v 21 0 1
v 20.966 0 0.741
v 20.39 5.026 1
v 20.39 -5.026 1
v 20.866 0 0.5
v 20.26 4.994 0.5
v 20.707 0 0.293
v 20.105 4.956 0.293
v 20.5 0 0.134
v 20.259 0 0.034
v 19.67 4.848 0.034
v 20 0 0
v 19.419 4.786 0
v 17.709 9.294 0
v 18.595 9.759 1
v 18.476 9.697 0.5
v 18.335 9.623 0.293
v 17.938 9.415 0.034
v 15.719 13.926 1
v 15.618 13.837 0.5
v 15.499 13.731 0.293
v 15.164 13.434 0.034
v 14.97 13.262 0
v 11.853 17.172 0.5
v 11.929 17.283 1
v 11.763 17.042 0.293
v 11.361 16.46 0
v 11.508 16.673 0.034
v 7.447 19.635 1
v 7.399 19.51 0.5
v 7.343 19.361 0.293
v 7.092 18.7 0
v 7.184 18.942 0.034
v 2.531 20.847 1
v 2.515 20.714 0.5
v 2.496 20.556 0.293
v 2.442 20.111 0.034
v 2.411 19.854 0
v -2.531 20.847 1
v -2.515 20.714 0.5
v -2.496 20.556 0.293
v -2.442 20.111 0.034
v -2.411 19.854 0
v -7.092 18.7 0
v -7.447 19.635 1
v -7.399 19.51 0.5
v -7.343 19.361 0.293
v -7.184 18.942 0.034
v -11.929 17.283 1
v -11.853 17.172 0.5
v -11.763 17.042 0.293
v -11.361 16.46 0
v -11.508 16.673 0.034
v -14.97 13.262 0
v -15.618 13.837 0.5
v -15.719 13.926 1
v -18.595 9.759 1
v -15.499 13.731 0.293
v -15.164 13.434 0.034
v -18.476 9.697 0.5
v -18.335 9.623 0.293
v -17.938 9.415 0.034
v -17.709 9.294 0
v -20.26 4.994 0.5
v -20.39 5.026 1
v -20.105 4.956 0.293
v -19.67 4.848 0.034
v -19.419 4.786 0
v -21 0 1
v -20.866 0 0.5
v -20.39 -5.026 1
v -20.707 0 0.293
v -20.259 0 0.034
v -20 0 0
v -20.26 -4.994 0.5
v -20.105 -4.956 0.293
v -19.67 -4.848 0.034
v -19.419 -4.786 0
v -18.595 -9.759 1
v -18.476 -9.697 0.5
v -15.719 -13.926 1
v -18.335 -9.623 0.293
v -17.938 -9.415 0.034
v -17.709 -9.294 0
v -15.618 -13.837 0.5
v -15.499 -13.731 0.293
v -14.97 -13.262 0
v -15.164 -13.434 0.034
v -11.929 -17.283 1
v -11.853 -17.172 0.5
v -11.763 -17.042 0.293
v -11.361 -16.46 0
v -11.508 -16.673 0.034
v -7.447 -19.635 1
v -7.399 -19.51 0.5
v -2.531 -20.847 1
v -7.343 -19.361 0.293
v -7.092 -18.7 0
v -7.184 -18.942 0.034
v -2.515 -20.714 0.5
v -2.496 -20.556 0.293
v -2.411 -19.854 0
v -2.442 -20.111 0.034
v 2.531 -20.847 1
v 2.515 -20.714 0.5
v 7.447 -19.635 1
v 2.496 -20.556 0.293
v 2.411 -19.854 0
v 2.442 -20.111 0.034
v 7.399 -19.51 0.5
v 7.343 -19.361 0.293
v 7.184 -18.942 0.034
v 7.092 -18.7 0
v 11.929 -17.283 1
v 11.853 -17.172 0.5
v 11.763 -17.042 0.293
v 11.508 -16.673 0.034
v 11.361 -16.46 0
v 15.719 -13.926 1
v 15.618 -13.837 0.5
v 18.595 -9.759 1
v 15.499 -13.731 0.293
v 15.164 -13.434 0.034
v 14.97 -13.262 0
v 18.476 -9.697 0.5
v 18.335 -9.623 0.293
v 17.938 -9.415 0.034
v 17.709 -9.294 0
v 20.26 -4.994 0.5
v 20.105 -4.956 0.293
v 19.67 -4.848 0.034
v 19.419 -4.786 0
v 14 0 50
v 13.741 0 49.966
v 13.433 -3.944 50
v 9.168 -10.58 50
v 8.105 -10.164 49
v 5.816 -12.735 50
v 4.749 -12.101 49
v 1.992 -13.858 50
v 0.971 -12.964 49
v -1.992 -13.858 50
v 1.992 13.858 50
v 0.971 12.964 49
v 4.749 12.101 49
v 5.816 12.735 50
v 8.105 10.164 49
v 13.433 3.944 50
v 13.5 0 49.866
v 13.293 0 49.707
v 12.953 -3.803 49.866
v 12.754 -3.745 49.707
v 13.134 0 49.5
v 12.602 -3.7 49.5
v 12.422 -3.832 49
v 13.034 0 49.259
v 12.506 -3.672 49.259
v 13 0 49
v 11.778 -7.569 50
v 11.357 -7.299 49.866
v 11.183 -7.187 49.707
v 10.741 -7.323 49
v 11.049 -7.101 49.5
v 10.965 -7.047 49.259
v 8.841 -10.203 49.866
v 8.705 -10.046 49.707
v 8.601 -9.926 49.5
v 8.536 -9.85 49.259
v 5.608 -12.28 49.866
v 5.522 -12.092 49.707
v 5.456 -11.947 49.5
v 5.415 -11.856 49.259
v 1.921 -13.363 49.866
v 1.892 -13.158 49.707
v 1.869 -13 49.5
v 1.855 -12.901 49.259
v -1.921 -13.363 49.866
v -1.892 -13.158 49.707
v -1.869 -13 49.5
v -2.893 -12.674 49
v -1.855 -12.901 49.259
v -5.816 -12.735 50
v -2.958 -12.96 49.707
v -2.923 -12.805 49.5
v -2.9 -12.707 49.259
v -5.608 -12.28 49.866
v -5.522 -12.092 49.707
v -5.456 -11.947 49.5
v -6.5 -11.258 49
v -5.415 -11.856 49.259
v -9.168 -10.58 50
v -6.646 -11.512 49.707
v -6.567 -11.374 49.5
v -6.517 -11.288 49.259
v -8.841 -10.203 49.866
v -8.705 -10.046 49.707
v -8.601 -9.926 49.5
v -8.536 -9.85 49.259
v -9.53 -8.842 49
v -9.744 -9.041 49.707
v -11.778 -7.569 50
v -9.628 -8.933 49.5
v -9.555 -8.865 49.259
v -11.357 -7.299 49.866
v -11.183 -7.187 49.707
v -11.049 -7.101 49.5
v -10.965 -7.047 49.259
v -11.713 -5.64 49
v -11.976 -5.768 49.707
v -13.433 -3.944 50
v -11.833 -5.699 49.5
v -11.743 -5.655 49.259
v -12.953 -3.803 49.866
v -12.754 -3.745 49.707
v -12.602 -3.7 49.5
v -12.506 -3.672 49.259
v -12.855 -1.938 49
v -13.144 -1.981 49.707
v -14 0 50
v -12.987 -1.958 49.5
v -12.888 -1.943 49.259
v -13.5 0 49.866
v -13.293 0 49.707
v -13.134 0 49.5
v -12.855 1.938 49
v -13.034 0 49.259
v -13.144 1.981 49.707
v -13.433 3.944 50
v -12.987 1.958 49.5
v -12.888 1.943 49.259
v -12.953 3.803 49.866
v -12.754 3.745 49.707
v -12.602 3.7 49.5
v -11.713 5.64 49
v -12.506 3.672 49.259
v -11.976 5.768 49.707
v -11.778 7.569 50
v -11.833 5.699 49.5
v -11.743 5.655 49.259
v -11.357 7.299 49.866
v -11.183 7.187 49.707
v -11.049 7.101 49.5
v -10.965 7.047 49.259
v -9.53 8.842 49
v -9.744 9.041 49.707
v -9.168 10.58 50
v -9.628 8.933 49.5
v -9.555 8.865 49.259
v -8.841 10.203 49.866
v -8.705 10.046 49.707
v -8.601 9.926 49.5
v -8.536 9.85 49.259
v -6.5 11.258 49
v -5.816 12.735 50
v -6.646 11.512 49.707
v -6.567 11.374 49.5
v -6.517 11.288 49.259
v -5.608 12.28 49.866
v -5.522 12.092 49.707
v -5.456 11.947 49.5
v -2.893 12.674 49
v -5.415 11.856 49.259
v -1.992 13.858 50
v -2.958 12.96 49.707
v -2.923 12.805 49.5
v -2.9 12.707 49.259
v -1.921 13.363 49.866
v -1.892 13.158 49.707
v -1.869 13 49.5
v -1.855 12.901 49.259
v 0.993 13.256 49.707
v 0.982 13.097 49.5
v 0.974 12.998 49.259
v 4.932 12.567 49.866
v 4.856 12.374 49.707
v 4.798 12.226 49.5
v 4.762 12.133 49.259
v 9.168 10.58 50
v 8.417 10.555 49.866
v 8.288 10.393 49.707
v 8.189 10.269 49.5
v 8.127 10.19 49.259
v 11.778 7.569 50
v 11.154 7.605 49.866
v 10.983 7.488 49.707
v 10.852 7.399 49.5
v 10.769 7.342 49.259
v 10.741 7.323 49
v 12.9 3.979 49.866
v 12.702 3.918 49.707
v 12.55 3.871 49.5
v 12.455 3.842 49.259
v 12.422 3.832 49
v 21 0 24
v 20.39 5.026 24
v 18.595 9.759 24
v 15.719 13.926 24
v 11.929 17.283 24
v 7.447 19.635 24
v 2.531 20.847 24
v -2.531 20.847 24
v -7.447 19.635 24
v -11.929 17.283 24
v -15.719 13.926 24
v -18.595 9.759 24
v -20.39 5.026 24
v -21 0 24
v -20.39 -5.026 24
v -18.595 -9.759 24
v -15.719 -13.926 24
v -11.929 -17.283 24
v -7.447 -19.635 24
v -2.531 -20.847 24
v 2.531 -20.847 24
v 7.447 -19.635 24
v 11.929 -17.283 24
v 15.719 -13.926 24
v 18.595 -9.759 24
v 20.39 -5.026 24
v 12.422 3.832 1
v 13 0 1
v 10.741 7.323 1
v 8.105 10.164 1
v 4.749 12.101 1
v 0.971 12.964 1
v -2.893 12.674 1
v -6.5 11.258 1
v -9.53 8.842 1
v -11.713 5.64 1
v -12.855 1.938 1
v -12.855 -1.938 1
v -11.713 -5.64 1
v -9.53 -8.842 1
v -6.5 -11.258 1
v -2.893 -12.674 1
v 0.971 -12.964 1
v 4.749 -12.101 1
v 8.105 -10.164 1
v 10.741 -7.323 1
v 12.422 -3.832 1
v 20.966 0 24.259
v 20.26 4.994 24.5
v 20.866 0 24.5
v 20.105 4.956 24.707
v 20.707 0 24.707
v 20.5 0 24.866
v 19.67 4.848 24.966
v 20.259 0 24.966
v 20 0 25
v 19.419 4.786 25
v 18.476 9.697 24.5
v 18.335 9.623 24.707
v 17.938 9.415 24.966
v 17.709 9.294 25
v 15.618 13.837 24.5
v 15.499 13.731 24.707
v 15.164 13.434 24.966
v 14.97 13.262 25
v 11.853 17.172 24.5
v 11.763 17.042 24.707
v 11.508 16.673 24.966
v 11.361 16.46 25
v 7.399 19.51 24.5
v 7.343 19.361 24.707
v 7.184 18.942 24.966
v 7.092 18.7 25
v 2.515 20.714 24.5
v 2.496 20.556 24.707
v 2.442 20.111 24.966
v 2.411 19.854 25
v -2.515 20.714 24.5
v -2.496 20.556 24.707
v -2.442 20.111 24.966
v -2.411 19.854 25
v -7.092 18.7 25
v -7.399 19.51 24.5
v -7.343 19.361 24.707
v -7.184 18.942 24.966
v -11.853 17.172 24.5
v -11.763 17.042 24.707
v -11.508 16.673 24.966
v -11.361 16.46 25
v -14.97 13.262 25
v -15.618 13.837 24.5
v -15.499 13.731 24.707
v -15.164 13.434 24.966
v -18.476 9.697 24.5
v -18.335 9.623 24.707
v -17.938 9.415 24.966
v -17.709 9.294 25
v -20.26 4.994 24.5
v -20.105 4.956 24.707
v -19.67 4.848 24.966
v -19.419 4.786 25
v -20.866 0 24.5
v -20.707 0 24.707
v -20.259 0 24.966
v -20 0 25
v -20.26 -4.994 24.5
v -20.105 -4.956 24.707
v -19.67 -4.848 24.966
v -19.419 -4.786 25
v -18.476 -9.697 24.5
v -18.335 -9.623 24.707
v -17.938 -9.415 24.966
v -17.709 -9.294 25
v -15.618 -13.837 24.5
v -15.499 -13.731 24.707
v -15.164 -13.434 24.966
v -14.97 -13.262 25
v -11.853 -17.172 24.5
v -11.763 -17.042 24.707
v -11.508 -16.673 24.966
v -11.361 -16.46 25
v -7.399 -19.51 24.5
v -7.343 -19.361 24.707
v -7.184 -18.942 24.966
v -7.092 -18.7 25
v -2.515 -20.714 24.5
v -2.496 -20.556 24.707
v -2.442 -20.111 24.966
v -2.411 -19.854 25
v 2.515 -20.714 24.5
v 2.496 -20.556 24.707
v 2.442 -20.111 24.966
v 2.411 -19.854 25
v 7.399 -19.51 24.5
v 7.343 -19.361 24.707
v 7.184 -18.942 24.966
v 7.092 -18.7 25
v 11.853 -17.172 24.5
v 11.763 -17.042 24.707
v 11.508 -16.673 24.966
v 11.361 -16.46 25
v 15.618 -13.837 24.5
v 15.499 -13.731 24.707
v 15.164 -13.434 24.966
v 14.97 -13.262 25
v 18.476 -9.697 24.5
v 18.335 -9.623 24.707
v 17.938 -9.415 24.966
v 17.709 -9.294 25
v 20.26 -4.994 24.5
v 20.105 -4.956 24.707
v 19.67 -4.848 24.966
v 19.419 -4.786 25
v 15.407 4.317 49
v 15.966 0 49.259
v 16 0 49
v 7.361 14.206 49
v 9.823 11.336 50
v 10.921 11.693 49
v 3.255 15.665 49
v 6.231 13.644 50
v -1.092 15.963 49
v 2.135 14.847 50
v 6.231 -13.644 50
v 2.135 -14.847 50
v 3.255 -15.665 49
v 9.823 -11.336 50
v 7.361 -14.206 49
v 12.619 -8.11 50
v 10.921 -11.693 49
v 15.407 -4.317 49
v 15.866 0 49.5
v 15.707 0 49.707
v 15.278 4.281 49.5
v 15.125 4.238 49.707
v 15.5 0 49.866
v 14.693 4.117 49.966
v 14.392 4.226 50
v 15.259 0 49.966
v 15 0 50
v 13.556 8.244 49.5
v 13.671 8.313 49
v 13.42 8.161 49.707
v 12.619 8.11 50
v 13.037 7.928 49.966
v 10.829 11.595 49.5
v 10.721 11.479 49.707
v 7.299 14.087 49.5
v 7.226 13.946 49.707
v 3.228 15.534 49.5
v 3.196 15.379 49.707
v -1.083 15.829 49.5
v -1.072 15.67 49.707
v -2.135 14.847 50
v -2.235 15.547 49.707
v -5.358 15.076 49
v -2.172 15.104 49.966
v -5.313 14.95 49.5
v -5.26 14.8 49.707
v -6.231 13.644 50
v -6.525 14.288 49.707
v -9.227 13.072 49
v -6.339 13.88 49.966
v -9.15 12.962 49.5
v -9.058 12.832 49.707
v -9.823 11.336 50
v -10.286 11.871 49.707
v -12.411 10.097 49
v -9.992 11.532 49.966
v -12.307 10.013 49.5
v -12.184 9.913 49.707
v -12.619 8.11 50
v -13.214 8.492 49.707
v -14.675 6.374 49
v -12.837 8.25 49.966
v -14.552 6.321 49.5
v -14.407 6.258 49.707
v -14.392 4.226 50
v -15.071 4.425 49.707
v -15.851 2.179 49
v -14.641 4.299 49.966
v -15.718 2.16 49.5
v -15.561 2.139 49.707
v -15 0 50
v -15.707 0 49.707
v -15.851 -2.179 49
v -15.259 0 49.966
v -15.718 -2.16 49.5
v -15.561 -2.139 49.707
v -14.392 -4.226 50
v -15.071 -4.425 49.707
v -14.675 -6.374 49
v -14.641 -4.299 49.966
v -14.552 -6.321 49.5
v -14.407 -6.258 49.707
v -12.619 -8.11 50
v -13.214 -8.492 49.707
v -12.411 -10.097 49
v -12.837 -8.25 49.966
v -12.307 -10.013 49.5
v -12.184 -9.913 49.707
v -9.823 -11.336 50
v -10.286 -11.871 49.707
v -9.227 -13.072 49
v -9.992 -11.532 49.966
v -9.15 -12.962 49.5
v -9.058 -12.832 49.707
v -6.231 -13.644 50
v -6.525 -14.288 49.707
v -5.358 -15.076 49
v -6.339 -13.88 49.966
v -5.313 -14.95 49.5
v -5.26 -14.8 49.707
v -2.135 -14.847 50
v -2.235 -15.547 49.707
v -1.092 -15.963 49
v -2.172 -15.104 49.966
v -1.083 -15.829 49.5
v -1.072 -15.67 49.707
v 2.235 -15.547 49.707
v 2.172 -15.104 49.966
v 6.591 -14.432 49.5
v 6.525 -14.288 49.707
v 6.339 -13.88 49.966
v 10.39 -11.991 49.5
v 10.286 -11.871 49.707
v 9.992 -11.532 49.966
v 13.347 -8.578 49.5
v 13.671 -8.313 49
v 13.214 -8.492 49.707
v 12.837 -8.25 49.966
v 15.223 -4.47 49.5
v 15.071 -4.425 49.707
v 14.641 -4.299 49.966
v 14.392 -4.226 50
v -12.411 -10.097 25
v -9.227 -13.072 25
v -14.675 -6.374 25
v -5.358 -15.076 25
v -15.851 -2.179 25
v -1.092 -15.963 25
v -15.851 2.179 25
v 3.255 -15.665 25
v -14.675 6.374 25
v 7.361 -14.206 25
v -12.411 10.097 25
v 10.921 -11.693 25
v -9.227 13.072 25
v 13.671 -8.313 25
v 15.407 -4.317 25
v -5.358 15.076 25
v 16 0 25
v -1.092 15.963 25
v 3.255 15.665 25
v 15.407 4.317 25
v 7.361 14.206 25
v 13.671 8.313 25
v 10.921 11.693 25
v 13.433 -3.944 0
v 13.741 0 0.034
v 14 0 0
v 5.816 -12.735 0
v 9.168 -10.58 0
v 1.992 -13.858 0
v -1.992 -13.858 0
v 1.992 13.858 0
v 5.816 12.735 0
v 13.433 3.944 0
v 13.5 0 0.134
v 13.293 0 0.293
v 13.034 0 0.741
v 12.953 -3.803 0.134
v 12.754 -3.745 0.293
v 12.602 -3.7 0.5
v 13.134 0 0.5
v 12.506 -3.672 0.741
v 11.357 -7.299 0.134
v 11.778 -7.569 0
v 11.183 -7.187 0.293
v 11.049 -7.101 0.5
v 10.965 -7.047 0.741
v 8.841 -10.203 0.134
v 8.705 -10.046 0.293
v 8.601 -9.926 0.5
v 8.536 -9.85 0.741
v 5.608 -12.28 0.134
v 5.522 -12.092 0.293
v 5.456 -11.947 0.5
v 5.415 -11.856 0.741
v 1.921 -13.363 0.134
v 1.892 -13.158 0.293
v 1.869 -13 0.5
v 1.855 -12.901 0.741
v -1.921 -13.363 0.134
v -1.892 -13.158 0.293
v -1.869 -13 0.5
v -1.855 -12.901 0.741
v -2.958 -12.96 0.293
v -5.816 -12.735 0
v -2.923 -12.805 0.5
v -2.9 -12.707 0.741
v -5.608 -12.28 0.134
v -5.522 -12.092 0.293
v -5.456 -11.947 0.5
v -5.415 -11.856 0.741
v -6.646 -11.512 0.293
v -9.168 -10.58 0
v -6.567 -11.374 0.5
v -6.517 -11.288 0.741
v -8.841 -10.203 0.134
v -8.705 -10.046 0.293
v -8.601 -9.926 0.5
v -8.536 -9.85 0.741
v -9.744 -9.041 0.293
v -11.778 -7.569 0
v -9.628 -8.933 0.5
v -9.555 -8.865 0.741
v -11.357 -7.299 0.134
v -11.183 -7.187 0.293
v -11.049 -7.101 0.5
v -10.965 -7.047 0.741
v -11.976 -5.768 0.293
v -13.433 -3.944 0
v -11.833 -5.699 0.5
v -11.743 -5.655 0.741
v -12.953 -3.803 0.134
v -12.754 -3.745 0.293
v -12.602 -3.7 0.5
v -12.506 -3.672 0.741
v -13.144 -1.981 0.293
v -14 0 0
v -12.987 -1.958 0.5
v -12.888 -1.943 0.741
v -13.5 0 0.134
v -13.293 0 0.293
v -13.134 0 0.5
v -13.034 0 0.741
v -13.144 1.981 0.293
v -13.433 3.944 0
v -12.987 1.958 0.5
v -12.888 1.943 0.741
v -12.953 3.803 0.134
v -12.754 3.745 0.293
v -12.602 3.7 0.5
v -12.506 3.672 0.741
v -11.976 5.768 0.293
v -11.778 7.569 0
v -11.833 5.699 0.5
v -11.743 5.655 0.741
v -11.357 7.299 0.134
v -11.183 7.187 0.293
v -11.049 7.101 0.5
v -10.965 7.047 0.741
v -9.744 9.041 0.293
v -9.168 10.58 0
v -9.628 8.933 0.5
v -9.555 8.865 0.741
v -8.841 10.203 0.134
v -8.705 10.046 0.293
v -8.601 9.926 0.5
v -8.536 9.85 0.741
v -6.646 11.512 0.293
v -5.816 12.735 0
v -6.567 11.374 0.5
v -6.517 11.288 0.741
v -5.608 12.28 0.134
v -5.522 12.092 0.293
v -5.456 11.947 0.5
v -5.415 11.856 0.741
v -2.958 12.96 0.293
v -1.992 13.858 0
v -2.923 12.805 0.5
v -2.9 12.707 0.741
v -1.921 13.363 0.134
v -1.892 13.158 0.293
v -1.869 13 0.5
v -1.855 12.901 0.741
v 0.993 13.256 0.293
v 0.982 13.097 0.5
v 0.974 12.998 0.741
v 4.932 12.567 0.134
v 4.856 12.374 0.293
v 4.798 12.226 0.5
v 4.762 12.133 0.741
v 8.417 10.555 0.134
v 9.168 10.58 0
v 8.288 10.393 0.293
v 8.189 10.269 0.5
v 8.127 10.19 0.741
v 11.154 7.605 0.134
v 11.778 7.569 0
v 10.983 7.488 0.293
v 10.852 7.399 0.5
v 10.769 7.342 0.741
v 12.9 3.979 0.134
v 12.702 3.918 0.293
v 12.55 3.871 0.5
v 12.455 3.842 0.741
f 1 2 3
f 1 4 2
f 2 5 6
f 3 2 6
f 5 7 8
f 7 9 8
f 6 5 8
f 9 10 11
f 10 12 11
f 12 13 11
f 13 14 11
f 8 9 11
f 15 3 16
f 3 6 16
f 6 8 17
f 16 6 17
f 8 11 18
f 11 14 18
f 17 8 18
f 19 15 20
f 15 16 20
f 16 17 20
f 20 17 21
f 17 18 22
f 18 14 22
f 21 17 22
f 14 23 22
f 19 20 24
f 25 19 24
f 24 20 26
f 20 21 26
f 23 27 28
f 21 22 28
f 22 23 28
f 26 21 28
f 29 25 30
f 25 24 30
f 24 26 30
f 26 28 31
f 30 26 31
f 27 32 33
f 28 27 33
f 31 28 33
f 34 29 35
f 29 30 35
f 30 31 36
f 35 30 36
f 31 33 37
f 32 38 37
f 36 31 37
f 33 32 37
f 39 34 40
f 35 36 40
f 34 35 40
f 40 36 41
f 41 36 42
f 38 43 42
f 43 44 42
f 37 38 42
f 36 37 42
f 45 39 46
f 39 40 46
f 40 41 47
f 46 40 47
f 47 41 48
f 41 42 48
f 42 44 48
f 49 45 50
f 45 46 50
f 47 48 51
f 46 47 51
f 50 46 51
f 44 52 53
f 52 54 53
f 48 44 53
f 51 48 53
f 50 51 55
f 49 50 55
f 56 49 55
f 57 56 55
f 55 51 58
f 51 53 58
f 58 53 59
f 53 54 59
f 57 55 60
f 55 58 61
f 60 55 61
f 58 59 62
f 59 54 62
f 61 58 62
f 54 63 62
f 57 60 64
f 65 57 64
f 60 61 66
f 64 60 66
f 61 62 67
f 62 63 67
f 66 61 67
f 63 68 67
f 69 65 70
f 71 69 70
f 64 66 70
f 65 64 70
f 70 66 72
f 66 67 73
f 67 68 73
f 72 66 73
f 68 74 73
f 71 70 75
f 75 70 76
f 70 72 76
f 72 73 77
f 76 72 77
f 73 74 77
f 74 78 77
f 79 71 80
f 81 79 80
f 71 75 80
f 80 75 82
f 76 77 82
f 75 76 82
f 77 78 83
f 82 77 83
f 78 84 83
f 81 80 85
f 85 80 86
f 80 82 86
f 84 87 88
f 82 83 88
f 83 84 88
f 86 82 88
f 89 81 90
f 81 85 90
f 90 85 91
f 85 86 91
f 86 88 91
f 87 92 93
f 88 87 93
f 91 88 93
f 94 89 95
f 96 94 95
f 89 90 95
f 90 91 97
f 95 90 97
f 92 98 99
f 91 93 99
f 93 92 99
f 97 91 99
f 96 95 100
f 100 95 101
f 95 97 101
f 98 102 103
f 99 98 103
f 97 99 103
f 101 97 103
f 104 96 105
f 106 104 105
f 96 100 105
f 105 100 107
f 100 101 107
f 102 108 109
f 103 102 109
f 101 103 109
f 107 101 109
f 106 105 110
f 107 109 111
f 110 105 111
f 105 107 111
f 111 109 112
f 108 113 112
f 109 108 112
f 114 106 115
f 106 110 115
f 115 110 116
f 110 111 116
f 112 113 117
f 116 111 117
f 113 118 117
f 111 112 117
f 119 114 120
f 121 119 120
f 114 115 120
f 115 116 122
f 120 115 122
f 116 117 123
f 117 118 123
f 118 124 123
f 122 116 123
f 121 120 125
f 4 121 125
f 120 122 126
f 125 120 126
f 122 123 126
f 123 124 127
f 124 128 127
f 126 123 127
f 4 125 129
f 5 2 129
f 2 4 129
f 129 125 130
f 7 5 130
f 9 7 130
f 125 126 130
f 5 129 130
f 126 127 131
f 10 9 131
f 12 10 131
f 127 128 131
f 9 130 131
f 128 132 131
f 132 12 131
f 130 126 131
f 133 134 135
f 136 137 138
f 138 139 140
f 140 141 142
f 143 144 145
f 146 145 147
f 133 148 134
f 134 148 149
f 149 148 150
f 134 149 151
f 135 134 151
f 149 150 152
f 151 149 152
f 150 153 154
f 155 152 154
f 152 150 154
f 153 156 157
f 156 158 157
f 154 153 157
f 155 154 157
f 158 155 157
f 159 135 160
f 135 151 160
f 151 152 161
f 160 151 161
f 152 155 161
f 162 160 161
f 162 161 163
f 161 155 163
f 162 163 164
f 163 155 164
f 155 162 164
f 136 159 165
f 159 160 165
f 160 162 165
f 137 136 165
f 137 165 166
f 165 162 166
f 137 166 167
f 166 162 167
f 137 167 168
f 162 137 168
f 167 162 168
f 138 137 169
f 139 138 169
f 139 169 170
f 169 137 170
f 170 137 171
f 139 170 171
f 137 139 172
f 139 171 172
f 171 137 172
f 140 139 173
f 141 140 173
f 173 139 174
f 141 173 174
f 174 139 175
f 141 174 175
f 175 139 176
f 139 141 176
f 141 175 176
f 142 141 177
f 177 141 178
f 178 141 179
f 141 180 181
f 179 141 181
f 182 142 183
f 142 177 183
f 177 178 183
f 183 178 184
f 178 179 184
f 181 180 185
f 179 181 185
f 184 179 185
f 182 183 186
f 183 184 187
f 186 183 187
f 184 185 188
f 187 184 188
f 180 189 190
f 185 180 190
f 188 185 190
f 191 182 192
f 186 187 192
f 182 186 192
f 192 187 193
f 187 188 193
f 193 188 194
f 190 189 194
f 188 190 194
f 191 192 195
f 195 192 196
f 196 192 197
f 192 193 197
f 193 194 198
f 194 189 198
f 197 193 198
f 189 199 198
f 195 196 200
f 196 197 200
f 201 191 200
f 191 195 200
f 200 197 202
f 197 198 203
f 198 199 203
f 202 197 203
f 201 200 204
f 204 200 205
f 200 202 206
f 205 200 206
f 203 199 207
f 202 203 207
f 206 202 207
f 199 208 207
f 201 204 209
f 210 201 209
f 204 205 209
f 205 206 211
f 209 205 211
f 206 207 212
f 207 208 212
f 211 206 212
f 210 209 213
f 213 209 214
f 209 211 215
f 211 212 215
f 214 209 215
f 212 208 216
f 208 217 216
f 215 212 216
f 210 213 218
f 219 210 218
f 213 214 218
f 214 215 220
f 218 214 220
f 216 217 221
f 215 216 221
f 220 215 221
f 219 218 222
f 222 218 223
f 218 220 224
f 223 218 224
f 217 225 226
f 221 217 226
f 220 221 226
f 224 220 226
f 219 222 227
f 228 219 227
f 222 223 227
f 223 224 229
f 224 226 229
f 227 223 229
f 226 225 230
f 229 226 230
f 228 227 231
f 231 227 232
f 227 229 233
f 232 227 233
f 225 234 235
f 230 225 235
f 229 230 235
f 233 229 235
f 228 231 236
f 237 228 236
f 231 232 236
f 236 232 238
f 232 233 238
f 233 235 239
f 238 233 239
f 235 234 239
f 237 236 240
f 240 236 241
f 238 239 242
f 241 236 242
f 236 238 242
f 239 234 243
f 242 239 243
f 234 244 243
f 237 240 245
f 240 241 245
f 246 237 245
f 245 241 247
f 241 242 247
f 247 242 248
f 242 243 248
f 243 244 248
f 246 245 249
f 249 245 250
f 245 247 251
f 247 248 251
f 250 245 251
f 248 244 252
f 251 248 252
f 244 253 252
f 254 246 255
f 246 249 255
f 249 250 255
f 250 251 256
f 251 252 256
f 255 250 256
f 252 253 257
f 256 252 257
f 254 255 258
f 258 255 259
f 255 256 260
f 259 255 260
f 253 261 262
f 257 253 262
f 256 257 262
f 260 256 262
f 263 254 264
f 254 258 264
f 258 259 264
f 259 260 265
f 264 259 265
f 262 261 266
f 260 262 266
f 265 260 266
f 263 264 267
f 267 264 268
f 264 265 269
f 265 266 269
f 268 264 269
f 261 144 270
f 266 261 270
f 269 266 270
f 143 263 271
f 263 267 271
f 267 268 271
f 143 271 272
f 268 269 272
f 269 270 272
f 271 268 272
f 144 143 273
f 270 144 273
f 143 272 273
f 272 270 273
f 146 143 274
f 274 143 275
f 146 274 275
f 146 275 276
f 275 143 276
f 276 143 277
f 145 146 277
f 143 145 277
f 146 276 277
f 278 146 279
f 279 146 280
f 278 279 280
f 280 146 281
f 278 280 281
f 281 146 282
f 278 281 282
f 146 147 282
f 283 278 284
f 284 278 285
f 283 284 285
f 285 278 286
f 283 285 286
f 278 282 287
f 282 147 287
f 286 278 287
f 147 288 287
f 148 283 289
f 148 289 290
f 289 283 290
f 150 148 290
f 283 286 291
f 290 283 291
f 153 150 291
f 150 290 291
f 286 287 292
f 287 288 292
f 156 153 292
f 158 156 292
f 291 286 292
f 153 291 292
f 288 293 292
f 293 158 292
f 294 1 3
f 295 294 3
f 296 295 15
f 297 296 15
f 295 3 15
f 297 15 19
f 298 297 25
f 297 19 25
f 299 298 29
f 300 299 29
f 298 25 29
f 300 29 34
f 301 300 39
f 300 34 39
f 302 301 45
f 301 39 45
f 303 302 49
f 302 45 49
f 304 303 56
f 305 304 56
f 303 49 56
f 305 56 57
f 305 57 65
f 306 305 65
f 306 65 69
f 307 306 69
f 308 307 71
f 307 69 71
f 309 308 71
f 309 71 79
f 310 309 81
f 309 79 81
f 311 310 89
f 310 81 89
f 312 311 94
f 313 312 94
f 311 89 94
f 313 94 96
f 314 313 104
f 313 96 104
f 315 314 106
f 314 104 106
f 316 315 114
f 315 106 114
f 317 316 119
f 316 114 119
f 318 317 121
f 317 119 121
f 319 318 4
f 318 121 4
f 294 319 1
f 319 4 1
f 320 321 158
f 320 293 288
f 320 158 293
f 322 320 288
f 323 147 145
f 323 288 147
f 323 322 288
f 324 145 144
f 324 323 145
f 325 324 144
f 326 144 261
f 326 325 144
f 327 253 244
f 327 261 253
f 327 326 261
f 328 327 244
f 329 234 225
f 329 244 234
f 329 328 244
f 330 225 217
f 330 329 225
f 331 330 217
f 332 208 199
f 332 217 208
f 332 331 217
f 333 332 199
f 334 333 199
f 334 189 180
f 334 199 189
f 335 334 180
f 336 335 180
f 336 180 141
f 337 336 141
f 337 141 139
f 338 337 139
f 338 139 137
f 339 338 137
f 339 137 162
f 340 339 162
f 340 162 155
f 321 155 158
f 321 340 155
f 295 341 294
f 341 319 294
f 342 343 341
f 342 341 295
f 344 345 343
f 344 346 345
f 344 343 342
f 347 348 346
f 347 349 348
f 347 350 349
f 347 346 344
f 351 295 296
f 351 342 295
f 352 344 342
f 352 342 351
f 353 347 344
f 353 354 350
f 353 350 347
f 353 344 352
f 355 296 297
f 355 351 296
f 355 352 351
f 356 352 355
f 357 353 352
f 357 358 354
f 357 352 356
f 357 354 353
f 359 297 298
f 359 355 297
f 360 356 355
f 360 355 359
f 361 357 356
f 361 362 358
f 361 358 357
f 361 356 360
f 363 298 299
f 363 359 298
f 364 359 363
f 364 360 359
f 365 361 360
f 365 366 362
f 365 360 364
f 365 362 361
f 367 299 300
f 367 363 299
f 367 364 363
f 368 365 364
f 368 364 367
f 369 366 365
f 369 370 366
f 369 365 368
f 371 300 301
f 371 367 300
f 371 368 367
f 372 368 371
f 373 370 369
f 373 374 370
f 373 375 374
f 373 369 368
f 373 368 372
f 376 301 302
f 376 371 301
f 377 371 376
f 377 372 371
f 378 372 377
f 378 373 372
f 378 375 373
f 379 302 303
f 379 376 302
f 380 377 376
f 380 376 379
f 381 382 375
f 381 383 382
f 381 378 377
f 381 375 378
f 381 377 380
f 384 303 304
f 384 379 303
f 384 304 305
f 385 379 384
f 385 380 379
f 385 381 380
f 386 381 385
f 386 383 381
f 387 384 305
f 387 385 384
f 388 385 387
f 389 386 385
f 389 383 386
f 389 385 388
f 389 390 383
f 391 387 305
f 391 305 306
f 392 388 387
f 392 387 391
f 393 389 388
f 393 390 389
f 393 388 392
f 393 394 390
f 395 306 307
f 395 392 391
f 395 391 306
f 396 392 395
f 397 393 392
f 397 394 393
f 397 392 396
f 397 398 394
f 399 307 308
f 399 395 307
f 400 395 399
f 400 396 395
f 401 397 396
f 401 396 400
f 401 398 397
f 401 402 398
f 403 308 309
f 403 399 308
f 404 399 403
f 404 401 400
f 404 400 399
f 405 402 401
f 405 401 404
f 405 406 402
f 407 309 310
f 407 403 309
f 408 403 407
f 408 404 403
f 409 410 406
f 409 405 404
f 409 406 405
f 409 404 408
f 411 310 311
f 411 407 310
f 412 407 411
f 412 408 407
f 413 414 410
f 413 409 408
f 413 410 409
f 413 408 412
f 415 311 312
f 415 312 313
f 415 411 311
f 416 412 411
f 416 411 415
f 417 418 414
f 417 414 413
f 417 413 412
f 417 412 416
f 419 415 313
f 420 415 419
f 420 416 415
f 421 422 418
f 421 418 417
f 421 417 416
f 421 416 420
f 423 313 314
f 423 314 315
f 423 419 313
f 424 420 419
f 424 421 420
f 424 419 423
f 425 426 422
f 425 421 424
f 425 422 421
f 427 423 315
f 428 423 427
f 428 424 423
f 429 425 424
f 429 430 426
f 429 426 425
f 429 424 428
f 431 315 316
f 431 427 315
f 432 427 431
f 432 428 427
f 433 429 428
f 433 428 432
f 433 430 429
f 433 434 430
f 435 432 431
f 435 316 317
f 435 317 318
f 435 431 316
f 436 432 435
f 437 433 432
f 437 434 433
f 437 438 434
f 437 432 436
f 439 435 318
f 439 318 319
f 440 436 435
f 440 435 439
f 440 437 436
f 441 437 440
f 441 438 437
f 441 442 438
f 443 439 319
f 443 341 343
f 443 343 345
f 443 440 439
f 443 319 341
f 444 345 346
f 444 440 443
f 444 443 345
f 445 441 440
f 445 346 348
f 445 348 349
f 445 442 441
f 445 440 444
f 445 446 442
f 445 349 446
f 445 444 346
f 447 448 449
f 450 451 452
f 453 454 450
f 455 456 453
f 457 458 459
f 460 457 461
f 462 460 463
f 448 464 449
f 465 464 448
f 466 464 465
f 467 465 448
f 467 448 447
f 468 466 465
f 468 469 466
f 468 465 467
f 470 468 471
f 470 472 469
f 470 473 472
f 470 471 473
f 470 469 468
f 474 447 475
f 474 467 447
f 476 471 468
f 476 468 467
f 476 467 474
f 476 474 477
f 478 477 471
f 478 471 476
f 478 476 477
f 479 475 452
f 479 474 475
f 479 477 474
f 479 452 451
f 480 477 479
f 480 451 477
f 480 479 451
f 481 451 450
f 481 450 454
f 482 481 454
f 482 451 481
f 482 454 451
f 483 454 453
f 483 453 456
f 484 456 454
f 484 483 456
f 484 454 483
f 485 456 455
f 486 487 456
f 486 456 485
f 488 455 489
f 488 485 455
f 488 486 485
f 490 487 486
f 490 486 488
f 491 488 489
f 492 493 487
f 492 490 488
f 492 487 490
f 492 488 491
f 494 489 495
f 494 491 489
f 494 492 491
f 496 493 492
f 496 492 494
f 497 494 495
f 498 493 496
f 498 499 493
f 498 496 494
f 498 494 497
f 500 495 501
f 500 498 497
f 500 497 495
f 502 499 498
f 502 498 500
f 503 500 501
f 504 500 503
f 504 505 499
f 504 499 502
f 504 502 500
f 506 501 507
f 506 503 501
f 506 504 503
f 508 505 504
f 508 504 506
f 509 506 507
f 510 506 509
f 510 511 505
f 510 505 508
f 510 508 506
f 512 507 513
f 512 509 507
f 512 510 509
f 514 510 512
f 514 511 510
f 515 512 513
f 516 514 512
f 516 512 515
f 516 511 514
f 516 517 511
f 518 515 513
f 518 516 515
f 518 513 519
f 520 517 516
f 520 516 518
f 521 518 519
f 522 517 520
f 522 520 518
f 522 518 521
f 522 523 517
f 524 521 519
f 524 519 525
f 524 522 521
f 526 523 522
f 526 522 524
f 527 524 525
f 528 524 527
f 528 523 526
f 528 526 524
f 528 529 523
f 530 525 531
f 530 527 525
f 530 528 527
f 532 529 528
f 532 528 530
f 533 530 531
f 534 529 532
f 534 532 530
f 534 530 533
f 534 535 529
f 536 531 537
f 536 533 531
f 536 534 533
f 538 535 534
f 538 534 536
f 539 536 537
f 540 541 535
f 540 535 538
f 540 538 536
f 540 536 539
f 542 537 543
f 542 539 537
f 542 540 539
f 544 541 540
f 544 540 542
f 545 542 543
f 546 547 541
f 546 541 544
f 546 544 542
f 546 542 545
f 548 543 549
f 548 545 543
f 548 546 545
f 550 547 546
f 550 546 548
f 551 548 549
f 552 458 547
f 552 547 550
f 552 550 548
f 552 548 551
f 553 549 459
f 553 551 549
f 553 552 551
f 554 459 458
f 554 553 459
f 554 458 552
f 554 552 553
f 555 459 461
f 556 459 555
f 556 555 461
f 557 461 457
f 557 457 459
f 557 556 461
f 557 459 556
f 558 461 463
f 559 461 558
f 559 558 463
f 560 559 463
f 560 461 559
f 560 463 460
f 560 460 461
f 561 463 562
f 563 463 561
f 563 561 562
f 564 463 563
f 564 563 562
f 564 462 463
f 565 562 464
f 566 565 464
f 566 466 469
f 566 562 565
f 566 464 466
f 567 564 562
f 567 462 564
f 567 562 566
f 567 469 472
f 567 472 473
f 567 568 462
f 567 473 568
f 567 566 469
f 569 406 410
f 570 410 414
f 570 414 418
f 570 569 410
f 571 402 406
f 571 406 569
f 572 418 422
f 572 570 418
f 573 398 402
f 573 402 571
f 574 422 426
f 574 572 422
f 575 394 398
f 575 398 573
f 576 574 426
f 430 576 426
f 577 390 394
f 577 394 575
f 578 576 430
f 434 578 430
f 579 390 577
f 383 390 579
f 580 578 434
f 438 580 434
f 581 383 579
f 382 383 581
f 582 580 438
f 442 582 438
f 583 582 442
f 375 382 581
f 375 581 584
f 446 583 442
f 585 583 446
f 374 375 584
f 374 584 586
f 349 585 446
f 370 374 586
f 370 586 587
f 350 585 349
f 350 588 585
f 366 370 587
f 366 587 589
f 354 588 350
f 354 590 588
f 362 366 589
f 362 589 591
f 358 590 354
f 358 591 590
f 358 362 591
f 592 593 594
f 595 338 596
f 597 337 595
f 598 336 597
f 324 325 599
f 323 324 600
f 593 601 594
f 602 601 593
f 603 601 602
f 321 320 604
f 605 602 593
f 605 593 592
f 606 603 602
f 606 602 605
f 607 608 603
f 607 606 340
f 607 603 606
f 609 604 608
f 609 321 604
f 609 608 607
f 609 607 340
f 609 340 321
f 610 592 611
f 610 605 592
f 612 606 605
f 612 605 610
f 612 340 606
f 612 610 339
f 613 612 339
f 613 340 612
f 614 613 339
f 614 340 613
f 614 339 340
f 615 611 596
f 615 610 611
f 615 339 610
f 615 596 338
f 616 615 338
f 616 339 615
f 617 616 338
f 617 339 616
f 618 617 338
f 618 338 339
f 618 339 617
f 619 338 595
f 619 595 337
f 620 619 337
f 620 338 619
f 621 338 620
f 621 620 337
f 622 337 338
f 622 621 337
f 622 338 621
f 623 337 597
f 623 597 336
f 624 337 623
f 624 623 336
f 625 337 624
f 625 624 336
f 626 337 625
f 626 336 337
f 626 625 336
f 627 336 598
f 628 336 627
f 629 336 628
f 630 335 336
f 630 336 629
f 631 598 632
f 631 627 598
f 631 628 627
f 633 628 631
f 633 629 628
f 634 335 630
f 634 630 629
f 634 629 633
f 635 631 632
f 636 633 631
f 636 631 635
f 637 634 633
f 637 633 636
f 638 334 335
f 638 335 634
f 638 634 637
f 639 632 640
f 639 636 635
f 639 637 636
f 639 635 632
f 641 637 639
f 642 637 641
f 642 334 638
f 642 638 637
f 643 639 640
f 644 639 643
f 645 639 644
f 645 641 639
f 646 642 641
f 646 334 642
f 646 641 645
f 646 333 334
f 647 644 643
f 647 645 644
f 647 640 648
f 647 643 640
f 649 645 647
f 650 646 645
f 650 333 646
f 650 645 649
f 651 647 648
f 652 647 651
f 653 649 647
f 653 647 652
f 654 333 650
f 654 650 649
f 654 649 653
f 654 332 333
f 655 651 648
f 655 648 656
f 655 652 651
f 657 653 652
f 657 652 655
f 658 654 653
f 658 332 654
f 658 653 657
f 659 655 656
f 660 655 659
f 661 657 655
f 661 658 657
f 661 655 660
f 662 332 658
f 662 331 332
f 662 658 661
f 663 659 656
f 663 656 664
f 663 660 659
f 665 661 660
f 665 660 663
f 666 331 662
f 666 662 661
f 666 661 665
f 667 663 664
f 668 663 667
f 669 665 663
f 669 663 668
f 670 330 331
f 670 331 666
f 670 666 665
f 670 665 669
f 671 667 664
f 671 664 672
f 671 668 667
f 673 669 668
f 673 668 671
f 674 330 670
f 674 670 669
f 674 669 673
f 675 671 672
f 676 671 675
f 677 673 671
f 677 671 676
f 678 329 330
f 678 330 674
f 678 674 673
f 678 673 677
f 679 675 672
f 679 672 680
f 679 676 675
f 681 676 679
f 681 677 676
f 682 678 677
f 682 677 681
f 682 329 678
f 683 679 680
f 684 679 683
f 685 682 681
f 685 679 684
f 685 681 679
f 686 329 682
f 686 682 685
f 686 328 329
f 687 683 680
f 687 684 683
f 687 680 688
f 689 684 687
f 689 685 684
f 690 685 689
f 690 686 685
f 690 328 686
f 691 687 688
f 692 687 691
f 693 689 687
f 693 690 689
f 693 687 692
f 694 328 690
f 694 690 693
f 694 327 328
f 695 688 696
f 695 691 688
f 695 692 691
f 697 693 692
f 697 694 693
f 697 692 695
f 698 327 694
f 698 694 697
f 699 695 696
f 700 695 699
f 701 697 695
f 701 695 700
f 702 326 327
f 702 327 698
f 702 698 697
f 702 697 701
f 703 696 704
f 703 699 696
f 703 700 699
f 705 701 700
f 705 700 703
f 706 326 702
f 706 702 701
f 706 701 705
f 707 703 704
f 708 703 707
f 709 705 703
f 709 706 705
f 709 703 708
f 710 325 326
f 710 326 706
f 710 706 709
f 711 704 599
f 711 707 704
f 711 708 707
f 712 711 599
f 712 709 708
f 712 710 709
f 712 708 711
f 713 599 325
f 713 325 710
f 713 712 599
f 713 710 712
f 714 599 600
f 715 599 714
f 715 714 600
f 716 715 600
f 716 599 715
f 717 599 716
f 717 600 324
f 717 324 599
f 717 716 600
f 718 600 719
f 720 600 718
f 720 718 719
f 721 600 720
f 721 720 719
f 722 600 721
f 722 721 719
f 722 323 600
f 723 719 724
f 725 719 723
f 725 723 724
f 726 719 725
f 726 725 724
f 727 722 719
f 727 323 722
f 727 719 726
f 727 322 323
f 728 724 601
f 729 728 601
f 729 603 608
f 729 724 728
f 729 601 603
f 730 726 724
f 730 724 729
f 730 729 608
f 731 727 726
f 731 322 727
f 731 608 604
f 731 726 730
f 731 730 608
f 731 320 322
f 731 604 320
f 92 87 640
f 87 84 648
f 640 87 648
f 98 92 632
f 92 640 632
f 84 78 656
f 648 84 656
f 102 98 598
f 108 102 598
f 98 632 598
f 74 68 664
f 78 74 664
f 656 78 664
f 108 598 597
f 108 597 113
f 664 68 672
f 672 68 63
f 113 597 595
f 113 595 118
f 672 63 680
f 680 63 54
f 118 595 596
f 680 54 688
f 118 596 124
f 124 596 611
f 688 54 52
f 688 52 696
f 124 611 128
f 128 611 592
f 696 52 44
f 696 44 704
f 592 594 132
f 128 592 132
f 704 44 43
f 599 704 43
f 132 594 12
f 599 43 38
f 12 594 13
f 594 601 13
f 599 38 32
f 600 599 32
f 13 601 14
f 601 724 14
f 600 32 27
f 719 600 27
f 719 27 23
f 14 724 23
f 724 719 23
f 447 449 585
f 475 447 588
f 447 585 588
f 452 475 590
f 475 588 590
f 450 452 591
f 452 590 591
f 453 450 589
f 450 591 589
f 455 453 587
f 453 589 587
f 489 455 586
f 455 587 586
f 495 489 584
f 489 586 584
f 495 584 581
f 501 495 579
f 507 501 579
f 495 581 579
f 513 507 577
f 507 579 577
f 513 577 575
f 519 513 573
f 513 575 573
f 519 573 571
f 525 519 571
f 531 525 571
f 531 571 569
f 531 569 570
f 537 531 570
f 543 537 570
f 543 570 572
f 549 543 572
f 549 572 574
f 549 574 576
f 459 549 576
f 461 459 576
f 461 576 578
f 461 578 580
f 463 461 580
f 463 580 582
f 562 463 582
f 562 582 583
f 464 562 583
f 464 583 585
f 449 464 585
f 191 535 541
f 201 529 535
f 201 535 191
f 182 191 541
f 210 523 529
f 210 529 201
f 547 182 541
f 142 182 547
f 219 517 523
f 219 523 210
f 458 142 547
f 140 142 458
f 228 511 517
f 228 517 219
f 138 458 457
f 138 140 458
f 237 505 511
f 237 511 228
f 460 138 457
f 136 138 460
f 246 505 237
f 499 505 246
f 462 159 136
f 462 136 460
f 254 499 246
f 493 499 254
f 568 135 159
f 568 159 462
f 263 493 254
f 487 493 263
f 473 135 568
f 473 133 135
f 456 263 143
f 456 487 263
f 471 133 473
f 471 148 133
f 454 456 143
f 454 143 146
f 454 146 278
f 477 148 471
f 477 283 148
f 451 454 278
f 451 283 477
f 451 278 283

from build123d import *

# Parameters (mm, degrees)
CYLINDER002_R     = 13
CYLINDER002_DEPTH = 120
CYLINDER001_R     = 16
CYLINDER001_DEPTH = 50
FILLET001_R       = 1
CYLINDER003_R     = 16
CYLINDER003_DEPTH = 120
CYLINDER_R        = 21
CYLINDER_DEPTH    = 25
FILLET_R          = 1


with BuildPart() as indre_hul:
    # Cylinder002 → Cylinder002 (new body)
    with BuildSketch(Plane.XY.offset(-60)):
        Circle(CYLINDER002_R)
    extrude(amount=CYLINDER002_DEPTH)


with BuildPart() as fillet001:
    # Cylinder001 → Cylinder001 (new body)
    with BuildSketch(Plane.XY):
        Circle(CYLINDER001_R)
    extrude(amount=CYLINDER001_DEPTH)

    # Cut: cut Indre hul
    add(indre_hul.part, mode=Mode.SUBTRACT)

    # Fillet001
    fillet001_edges = [fillet001.edges().sort_by_distance(p)[0] for p in [
        (-16, 0, 50),
        (-13, 0, 50),
        (-13, 0, 0),
    ]]
    fillet(fillet001_edges, radius=FILLET001_R)


with BuildPart() as indre_hul001:
    # Cylinder003 → Cylinder003 (new body)
    with BuildSketch(Plane.XY.offset(-60)):
        Circle(CYLINDER003_R)
    extrude(amount=CYLINDER003_DEPTH)


with BuildPart() as fusion:
    # Cylinder → Cylinder (new body)
    with BuildSketch(Plane.XY):
        Circle(CYLINDER_R)
    extrude(amount=CYLINDER_DEPTH)

    # Cut001: cut Indre hul001
    add(indre_hul001.part, mode=Mode.SUBTRACT)

    # Fillet
    fillet_edges = [fusion.edges().sort_by_distance(p)[0] for p in [
        (-21, 0, 25),
        (-21, 0, 0),
    ]]
    fillet(fillet_edges, radius=FILLET_R)

    # Fusion: union Fillet001
    add(fillet001.part)


solid = fusion.part
